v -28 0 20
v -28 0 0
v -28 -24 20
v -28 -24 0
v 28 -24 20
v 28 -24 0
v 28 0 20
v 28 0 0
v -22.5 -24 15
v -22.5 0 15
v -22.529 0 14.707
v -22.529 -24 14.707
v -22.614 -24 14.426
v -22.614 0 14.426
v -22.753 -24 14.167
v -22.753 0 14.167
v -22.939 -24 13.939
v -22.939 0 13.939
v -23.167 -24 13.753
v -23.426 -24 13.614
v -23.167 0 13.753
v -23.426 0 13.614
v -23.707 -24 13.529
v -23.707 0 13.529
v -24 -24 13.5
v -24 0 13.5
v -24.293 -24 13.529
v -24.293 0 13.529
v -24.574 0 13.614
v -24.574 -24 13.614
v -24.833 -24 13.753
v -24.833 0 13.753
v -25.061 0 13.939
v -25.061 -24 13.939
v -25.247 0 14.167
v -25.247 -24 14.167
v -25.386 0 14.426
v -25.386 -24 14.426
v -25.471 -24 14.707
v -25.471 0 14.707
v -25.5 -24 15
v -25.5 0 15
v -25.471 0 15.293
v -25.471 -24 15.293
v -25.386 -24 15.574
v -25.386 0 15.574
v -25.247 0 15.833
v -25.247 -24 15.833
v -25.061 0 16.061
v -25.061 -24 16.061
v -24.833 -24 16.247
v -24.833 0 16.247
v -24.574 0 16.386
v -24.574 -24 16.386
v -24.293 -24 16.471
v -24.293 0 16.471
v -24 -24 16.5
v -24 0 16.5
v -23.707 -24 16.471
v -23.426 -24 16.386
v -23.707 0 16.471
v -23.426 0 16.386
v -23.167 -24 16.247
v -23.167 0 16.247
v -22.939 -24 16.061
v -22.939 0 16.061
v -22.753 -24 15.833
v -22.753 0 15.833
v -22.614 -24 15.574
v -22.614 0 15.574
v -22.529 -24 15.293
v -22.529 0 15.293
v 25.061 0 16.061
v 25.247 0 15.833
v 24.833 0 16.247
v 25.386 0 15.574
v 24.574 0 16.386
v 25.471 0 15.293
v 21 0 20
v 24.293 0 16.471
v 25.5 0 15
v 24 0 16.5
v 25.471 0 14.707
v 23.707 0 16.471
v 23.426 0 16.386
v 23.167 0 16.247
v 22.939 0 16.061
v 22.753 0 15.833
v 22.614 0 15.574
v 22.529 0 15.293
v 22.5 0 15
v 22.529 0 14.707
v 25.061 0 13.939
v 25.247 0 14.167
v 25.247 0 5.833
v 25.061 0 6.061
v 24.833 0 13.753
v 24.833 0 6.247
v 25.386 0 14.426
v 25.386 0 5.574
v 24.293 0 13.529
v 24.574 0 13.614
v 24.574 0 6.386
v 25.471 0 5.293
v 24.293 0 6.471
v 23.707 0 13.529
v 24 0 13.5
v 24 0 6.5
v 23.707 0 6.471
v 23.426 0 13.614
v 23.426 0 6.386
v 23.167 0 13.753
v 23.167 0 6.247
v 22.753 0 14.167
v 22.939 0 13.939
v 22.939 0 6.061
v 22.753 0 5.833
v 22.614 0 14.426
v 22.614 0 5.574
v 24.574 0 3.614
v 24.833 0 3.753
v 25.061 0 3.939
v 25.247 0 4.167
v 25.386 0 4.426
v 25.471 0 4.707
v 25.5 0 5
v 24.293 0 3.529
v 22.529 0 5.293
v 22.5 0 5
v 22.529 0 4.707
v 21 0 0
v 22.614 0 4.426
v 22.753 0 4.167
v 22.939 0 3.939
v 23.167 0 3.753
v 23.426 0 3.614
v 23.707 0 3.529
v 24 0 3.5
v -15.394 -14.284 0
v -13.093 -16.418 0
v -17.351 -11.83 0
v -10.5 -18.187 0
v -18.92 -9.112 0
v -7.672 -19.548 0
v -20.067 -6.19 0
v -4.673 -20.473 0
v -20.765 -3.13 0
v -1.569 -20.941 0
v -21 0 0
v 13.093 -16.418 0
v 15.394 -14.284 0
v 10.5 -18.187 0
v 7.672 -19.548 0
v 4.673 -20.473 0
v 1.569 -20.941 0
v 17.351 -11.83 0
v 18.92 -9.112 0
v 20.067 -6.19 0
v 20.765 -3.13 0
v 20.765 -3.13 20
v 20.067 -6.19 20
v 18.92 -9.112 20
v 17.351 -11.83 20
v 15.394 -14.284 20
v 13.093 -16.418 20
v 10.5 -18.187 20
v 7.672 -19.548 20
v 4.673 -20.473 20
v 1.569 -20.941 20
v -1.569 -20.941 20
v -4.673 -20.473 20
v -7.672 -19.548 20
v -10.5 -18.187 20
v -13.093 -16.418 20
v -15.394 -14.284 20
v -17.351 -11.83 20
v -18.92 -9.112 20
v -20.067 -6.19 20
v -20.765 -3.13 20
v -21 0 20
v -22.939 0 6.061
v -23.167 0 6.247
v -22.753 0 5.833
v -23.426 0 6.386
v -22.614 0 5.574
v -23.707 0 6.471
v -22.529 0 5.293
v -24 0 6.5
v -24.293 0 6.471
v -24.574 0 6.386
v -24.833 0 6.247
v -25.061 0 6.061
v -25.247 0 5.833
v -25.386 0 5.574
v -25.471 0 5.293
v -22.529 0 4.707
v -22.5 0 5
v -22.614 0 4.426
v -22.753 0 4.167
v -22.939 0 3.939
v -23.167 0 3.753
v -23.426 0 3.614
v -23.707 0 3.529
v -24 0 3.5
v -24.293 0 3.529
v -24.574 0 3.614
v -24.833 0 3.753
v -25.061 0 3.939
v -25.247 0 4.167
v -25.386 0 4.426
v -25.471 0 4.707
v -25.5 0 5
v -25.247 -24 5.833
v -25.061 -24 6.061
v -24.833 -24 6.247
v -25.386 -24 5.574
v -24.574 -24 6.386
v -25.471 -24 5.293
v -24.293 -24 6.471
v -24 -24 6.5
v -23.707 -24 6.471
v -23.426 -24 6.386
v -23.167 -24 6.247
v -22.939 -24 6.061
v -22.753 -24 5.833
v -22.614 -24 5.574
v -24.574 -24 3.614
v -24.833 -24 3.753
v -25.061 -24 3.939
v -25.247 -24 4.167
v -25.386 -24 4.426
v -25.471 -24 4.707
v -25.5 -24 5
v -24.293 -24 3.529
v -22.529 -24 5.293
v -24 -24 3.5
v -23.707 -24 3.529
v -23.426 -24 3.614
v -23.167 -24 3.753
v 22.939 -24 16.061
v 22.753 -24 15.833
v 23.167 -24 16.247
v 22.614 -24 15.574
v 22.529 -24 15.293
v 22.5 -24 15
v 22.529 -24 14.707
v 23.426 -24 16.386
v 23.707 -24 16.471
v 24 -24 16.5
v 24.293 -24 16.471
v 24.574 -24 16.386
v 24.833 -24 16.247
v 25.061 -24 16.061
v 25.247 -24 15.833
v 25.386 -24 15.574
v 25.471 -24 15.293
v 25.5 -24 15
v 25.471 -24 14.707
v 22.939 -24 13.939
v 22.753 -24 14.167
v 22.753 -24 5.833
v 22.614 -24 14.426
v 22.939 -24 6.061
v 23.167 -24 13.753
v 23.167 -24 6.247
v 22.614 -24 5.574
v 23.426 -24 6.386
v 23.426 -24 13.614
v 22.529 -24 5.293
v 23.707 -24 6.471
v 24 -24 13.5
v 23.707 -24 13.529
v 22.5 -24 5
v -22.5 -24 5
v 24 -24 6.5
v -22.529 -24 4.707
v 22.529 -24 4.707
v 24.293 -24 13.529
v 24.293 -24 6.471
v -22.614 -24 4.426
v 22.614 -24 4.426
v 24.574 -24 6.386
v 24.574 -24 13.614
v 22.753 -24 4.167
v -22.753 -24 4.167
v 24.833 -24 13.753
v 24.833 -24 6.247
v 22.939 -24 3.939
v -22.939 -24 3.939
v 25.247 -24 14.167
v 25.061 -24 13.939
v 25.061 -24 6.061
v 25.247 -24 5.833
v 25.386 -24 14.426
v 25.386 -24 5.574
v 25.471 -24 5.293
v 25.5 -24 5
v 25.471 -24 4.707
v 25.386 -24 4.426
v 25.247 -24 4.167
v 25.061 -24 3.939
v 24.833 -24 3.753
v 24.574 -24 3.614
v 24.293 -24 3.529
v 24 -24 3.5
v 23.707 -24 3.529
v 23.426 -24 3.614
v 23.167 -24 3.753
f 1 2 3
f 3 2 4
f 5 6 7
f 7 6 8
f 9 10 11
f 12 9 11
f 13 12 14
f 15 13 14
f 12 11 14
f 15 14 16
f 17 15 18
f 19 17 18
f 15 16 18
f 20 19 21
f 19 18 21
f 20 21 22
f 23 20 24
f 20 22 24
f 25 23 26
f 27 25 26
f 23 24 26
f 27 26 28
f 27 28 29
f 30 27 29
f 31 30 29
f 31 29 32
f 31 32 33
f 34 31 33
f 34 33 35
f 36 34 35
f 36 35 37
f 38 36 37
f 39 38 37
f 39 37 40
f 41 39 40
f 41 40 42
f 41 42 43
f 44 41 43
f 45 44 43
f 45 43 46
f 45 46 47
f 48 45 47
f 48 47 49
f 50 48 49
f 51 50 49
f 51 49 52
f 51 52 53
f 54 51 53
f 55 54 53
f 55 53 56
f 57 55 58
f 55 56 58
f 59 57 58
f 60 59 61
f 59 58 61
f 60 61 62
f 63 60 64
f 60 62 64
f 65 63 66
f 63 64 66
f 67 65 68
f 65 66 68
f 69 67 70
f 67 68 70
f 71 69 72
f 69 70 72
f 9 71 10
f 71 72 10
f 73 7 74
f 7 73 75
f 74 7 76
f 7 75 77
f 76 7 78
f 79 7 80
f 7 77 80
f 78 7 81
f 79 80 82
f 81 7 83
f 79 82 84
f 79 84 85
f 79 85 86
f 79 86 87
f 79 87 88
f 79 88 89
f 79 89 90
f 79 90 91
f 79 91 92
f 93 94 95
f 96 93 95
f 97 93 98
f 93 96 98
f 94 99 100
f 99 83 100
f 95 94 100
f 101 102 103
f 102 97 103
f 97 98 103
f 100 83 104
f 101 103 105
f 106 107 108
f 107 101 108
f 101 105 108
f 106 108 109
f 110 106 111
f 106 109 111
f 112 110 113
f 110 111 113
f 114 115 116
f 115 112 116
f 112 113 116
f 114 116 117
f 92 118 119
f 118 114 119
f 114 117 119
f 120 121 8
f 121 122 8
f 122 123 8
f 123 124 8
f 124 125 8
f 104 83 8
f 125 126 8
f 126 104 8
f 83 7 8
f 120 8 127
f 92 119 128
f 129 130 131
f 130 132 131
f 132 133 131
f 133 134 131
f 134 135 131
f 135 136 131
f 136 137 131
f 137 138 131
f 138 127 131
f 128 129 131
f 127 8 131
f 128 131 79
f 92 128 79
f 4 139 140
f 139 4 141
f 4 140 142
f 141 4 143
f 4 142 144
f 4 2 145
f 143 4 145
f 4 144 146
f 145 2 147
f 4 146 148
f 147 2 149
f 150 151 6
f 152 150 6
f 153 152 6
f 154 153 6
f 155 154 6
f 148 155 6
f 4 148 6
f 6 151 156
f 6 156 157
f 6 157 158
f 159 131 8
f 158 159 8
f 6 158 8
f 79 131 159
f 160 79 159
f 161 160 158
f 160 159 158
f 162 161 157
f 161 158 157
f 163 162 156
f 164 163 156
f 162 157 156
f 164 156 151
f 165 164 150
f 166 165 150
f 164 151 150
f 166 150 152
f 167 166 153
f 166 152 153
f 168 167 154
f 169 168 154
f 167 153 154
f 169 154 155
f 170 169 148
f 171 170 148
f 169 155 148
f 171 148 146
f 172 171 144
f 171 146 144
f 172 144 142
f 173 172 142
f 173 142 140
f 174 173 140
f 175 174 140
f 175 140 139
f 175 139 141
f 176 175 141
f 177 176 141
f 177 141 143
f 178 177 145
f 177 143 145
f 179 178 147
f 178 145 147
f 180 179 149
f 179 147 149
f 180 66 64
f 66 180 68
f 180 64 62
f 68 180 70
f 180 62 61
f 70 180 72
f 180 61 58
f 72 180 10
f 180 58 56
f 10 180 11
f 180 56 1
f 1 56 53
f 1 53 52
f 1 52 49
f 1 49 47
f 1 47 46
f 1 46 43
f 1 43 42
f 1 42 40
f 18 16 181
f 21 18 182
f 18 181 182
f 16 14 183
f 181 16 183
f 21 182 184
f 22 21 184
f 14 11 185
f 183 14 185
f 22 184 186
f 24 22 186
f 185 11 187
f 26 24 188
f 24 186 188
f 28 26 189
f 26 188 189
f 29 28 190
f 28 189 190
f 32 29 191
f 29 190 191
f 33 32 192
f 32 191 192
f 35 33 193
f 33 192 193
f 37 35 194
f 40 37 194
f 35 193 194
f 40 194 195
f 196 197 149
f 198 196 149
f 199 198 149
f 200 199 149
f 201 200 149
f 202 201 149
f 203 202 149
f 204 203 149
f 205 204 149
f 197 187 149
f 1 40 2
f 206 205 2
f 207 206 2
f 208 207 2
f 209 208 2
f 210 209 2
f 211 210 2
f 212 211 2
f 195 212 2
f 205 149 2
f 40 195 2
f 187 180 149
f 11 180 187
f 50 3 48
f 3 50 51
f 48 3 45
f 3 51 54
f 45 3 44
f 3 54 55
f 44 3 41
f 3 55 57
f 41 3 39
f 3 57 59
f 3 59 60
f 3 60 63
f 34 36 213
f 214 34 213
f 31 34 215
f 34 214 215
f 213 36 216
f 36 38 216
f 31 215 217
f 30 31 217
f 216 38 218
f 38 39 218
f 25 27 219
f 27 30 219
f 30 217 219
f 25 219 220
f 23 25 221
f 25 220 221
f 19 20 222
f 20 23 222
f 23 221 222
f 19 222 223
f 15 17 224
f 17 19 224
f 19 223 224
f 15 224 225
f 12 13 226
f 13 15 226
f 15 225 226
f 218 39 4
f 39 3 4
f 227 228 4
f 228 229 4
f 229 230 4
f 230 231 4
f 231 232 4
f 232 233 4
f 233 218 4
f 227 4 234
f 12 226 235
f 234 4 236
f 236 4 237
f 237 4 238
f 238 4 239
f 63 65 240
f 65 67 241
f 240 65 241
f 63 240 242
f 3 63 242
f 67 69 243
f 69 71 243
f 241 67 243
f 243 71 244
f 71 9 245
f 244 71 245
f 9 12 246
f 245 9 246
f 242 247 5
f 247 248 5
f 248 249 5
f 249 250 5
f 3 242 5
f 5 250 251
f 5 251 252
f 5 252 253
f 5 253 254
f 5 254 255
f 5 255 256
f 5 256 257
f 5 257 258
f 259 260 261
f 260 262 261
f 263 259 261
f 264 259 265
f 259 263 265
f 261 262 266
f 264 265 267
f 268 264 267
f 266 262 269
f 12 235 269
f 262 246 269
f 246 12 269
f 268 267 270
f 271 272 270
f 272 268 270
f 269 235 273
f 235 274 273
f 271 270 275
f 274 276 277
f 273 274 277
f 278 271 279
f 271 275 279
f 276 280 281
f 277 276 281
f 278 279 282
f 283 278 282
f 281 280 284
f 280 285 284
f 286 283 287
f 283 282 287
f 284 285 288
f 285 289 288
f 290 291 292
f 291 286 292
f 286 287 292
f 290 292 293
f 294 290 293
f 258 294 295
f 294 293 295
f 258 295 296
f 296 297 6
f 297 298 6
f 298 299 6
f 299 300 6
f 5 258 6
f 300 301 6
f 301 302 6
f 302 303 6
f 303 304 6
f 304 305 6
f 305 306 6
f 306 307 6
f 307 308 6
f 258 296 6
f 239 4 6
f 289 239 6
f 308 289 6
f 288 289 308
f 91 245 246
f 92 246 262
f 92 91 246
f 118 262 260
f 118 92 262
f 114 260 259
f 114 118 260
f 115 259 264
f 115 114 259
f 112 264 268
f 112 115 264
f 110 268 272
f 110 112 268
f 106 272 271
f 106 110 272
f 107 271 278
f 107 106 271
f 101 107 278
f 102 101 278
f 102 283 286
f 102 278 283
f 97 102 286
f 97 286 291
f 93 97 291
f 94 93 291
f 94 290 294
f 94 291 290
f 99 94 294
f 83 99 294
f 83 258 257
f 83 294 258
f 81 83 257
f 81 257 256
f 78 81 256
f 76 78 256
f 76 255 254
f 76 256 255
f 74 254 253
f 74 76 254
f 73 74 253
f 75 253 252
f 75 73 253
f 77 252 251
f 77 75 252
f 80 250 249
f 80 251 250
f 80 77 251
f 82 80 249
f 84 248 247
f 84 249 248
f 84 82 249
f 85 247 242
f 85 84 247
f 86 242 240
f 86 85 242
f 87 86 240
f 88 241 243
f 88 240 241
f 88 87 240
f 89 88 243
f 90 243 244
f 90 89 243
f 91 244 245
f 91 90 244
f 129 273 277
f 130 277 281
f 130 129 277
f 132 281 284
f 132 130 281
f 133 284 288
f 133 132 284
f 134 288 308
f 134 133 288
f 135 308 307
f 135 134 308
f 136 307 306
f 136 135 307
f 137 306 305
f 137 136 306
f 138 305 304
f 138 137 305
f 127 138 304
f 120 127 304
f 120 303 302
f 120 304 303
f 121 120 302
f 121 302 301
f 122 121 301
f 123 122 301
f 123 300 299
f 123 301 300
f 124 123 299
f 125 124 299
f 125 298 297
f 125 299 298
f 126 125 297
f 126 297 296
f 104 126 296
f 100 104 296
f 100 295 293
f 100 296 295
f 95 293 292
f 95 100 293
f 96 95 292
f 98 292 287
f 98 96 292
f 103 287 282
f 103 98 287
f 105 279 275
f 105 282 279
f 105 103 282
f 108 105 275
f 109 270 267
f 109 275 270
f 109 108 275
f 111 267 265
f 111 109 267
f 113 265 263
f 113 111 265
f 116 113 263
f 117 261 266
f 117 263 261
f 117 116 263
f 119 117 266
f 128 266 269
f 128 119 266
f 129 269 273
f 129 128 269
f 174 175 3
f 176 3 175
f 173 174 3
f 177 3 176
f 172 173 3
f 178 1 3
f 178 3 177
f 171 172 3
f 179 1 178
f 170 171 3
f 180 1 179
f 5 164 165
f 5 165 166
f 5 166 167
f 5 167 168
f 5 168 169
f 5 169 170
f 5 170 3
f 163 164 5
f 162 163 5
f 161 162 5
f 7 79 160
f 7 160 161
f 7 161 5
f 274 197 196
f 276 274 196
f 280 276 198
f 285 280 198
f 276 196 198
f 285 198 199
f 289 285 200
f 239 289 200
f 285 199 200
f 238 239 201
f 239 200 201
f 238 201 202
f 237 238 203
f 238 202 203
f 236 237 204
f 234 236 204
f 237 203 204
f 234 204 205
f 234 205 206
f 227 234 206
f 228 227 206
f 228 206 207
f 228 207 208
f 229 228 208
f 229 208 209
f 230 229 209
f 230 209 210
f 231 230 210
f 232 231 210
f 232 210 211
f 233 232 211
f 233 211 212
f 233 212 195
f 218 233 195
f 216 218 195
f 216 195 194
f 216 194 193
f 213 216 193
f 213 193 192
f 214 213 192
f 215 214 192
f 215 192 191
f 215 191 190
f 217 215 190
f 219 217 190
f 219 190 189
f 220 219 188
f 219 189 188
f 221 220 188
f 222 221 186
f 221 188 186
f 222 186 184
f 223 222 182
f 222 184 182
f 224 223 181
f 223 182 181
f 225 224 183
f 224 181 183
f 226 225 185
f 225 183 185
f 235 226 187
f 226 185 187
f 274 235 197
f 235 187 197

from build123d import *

# Parameters (mm, degrees)
EXTRUDE_1_DEPTH     = 20
SKETCH_2_R          = 1.5
CUT_EXTRUDE_1_DEPTH = 25


with BuildPart() as part:
    # 草图1 → 凸台-拉伸1 (new body)
    with BuildSketch(Plane.XY):
        with BuildLine():
            Line((-28, -24), (28, -24))
            Line((28, -24), (28, 0))
            Line((28, 0), (21, 0))
            ThreePointArc((21, 0), (0, -21), (-21, 0))
            Line((-21, 0), (-28, 0))
            Line((-28, 0), (-28, -24))
        make_face()
    extrude(amount=EXTRUDE_1_DEPTH)

    # 草图2 → 切除-拉伸1 (cut, through all)
    with BuildSketch(Plane(origin=(0, 0, 0), x_dir=(1, 0, 0), z_dir=(0, 1, 0))):
        with Locations((-24, -5)):
            Circle(SKETCH_2_R)
        with Locations((-24, -15)):
            Circle(SKETCH_2_R)
    cut_extrude_1 = extrude(amount=-CUT_EXTRUDE_1_DEPTH, mode=Mode.SUBTRACT)

    # 镜向1: 切除-拉伸1 across plane
    add(cut_extrude_1.mirror(Plane(origin=(0, 0, 0), x_dir=(0, 0, 1), z_dir=(1, 0, 0))), mode=Mode.SUBTRACT)


solid = part.part
